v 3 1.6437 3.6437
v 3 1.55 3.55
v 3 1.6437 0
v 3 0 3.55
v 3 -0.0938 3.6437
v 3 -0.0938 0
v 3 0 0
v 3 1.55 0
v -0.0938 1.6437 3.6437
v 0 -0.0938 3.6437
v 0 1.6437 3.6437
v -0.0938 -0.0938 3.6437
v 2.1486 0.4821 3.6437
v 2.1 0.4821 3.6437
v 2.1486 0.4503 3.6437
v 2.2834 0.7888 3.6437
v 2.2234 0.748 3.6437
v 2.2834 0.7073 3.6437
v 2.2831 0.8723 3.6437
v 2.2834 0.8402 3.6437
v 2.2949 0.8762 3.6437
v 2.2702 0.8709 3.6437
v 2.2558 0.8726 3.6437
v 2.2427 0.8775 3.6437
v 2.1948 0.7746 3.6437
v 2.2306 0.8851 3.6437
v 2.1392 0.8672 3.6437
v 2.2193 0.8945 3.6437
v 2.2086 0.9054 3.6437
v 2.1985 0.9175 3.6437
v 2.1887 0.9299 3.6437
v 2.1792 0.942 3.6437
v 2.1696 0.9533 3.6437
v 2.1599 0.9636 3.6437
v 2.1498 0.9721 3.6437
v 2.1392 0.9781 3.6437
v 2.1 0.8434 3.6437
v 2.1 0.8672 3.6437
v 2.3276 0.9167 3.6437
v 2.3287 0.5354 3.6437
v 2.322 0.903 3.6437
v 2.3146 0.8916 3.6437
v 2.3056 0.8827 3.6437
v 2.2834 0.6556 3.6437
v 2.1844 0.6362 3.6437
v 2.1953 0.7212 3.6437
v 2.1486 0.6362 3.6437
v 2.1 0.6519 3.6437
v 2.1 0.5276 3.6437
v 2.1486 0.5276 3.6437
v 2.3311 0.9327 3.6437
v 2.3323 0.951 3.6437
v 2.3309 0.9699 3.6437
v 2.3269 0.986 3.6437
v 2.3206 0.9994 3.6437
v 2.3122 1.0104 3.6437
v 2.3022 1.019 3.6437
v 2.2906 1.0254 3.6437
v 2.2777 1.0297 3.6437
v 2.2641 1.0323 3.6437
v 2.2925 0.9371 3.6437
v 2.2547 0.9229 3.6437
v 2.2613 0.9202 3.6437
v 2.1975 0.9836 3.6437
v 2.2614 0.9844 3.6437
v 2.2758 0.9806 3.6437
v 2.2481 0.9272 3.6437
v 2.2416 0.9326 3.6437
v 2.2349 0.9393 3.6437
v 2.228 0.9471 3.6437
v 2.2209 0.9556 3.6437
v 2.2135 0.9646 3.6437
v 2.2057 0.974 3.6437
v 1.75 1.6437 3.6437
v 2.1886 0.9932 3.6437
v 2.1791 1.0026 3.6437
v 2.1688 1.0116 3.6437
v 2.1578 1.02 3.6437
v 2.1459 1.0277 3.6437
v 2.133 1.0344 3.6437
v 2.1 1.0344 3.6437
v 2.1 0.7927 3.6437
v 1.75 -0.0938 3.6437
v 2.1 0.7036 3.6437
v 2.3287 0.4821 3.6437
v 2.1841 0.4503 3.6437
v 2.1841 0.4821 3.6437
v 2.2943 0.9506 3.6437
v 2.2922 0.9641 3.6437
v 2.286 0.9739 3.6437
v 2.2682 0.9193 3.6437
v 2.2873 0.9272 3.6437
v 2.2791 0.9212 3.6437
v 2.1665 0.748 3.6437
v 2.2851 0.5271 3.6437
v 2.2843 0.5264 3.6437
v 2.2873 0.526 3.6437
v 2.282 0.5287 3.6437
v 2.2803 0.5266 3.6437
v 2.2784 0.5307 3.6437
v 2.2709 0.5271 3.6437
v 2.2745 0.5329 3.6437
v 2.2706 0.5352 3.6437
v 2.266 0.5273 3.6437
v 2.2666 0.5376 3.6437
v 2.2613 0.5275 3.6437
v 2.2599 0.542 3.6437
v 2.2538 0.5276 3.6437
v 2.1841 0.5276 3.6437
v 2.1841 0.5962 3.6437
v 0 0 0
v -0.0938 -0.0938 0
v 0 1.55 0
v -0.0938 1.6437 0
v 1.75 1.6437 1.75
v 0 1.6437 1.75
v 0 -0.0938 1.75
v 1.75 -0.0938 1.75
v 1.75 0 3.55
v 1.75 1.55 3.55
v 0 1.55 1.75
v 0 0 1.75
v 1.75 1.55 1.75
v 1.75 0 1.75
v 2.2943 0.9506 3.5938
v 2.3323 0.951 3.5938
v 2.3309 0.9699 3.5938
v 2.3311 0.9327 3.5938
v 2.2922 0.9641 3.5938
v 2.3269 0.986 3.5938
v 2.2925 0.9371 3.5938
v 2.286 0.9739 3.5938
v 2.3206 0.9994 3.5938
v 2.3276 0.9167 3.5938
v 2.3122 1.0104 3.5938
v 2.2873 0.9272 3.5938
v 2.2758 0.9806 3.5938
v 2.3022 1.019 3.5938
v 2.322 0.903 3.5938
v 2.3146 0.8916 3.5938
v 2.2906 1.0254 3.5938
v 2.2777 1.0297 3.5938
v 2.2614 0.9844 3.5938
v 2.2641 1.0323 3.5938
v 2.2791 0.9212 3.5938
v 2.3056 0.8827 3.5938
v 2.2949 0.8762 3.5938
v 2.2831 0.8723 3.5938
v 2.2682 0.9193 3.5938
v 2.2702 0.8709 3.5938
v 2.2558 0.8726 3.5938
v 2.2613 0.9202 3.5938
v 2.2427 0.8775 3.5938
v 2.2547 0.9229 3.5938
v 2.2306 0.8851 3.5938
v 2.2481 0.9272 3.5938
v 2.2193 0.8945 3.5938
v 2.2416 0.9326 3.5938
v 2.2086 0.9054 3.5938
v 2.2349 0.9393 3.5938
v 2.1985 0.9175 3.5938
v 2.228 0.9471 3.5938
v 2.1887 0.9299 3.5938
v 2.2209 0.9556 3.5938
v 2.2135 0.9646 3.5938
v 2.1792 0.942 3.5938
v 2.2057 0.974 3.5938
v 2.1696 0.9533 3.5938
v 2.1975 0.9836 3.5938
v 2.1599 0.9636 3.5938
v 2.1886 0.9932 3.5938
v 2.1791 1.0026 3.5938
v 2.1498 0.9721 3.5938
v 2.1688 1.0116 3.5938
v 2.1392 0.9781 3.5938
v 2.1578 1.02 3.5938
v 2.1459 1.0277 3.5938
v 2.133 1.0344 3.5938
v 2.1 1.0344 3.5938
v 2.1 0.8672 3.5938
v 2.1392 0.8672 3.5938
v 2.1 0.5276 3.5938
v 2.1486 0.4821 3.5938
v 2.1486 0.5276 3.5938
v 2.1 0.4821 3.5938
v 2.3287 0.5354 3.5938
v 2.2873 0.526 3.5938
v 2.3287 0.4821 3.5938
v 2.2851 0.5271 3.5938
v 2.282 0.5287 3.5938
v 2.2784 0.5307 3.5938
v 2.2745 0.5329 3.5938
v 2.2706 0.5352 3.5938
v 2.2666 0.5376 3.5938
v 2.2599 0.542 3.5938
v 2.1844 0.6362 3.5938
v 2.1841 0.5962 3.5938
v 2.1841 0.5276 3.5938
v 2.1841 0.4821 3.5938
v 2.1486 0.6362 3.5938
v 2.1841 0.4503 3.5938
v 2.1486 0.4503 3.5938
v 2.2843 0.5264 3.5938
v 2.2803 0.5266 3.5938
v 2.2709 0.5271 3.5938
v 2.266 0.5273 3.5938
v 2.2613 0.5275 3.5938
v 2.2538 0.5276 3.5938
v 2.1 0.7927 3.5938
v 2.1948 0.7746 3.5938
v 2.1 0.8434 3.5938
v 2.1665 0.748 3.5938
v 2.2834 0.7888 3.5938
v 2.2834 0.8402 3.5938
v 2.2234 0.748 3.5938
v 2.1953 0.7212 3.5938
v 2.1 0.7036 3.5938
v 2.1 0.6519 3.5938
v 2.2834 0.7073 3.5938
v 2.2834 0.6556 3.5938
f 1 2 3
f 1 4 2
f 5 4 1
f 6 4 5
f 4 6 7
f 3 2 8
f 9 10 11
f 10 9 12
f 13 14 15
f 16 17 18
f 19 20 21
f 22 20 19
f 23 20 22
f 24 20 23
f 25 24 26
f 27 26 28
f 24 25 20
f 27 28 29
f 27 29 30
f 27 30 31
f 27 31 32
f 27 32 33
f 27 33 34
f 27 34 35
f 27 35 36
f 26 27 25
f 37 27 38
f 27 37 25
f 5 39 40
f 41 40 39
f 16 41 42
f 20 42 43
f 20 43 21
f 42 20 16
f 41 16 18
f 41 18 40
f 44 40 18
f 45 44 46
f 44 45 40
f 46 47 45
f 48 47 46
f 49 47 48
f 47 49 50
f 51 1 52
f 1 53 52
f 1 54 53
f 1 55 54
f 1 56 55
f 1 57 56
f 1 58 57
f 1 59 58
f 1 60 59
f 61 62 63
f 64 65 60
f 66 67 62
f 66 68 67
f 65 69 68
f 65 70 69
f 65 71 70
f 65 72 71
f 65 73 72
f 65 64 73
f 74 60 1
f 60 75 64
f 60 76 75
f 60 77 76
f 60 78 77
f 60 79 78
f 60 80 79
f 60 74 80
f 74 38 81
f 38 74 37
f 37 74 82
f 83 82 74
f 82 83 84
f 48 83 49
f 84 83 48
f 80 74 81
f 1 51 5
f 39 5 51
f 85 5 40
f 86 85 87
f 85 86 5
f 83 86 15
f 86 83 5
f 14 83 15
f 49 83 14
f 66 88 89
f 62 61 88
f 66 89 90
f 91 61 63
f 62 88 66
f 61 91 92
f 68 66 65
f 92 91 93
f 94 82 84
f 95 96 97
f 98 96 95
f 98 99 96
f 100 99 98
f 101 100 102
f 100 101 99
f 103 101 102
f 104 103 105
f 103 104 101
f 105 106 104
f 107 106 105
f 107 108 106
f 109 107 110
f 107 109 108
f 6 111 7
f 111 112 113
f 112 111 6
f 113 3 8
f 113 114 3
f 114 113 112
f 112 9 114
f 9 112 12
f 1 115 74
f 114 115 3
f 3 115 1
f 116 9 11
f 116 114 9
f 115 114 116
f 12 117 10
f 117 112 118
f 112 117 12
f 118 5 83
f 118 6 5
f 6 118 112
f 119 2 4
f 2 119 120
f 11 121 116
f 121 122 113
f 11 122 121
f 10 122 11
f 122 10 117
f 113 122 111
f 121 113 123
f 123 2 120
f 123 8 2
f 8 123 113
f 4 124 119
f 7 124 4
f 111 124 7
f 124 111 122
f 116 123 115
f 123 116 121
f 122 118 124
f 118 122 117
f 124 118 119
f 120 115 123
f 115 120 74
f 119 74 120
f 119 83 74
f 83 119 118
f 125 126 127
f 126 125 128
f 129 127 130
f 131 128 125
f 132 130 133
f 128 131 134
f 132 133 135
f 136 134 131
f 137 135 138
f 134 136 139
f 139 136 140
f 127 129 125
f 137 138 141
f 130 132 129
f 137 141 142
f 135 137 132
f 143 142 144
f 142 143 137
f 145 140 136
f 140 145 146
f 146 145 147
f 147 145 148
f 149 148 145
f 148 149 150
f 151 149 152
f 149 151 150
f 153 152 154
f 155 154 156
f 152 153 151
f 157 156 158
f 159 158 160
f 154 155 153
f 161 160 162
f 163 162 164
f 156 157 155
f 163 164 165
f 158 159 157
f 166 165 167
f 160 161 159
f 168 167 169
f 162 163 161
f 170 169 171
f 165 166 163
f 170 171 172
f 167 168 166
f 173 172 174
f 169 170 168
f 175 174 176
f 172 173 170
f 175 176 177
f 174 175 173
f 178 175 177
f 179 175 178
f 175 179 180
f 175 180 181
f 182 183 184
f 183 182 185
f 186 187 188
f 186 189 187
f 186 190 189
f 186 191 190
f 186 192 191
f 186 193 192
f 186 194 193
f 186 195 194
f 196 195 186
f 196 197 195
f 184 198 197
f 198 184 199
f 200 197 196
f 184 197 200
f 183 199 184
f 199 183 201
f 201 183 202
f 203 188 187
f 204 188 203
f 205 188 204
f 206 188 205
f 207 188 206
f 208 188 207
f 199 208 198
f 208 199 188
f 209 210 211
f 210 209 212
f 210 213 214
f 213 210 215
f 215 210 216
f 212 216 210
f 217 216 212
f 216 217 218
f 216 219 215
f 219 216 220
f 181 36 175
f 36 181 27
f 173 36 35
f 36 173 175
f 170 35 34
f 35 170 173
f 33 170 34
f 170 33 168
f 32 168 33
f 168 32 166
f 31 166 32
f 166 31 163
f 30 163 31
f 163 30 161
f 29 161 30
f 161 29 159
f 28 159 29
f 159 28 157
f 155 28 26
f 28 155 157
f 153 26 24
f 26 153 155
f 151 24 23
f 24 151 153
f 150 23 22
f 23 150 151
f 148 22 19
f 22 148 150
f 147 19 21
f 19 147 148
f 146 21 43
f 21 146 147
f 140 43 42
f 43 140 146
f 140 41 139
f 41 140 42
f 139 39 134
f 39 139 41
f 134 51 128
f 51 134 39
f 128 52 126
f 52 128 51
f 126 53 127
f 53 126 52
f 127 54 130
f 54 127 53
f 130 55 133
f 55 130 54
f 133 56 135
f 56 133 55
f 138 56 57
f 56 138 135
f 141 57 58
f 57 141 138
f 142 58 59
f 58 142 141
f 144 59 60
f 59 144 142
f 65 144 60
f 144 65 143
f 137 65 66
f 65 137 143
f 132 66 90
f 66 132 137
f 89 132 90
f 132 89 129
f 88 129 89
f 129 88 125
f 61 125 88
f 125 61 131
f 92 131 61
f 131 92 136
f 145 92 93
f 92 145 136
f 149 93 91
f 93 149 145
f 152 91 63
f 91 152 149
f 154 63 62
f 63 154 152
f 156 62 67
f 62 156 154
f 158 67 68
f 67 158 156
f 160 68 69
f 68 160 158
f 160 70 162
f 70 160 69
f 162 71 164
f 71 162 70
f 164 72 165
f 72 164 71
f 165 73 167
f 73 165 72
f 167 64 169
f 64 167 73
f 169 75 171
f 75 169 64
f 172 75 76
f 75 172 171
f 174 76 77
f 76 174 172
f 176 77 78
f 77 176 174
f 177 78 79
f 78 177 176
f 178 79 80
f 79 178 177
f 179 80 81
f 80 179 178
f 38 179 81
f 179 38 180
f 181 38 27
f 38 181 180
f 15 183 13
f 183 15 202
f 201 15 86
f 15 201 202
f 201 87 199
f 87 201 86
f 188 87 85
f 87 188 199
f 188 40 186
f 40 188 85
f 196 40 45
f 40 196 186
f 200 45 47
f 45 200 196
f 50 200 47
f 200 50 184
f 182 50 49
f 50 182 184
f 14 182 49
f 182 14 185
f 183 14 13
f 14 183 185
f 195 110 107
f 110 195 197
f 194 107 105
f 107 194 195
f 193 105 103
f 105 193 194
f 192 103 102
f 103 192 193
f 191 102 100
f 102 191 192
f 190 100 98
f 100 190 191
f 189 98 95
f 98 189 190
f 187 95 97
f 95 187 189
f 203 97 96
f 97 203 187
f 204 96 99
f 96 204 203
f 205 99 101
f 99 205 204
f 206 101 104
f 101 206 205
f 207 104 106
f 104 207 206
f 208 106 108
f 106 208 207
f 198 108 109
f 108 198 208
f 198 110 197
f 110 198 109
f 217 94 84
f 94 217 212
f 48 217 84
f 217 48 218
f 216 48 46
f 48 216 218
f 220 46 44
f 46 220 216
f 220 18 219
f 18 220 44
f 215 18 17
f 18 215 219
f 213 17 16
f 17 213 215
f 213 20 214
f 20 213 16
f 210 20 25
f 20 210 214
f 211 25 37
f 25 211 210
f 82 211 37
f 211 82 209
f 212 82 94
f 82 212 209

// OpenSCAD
// file: config.scad
// All dimensions in INCHES
convert_to_mm = false;

nominal_size = "2x4"; // name of the nominal size
board_wide_face = 3.5; // nominal 4"
board_narrow_face = 1.5; // nominal 2"

/*
This defines how much larger the inner dimensions of the template are than the
board, to account for slightly oversize boards or moisture swelling. Measuring
my current batch of 2x4s with calipers, I found that setting the calipers at
3.55" for the wide face, and 1.55" for the narrow face, let them slide over
all of the boards. So, we set the padding to 0.05".
*/
template_padding = 0.05;

// Thickness of the template walls
template_wall_thickness = 3/32;

// Length of the depth template
template_length = 4.0;

// Width of the cut in the depth gauge
saw_kerf = 0.2;

// Diameter of the router bit hole in the depth gauge
router_bit_dia = 1.4;

// Height of raised text
text_height = 1/16;
// file: modules/as_mm.scad
module as_mm(convert_to_mm = false) {
    if(convert_to_mm == false) {
        children();
    } else {
        scale([25.4,25.4,25.4]){ // inches to mm
            children();
        }
    }
}
// main file
use <modules/as_mm.scad>
include <config.scad>

as_mm(convert_to_mm) {
    template_depth = board_narrow_face * 2;
    difference() {
        // this cube represents the walls of the template. It will have no bottom
        translate([-1 * template_wall_thickness,-1 * template_wall_thickness,0]){
            cube([
              template_depth + template_wall_thickness,
              board_narrow_face + template_padding + (template_wall_thickness * 2),
              board_wide_face + template_padding + template_wall_thickness
            ]);
        }
        // this cube represents the inner face of the template, touching the lumber
        cube([template_depth, board_narrow_face + template_padding, board_wide_face + template_padding]);
        // cut-out for marking wide-face half-lap inner edge
        translate([board_narrow_face-(board_narrow_face/3),-1 * template_wall_thickness, board_wide_face * 0.5]){
            cube([
              board_narrow_face/3,
              board_narrow_face + template_padding + (2 * template_wall_thickness),
              board_wide_face
            ]);
        }
        // cutout for marking narrow-face half-lap inner edge
        translate([0,-1 * template_wall_thickness, board_wide_face * 0.5]){
            cube([
              board_wide_face * 0.5,
              board_narrow_face + template_padding + (2 * template_wall_thickness),
              board_wide_face
            ]);
        }
        // nominal dimension text
        translate([
          board_narrow_face * 1.4,
          board_narrow_face / 2,
          board_wide_face + template_wall_thickness
        ]){
            rotate([0,0,-90]){
                linear_extrude(2 * template_wall_thickness){
                    text(nominal_size, size=0.25, font="Liberation Mono:style=Bold", halign="center", valign="bottom");
                }
            }
        }
        // URL text won't fit
    }
}
